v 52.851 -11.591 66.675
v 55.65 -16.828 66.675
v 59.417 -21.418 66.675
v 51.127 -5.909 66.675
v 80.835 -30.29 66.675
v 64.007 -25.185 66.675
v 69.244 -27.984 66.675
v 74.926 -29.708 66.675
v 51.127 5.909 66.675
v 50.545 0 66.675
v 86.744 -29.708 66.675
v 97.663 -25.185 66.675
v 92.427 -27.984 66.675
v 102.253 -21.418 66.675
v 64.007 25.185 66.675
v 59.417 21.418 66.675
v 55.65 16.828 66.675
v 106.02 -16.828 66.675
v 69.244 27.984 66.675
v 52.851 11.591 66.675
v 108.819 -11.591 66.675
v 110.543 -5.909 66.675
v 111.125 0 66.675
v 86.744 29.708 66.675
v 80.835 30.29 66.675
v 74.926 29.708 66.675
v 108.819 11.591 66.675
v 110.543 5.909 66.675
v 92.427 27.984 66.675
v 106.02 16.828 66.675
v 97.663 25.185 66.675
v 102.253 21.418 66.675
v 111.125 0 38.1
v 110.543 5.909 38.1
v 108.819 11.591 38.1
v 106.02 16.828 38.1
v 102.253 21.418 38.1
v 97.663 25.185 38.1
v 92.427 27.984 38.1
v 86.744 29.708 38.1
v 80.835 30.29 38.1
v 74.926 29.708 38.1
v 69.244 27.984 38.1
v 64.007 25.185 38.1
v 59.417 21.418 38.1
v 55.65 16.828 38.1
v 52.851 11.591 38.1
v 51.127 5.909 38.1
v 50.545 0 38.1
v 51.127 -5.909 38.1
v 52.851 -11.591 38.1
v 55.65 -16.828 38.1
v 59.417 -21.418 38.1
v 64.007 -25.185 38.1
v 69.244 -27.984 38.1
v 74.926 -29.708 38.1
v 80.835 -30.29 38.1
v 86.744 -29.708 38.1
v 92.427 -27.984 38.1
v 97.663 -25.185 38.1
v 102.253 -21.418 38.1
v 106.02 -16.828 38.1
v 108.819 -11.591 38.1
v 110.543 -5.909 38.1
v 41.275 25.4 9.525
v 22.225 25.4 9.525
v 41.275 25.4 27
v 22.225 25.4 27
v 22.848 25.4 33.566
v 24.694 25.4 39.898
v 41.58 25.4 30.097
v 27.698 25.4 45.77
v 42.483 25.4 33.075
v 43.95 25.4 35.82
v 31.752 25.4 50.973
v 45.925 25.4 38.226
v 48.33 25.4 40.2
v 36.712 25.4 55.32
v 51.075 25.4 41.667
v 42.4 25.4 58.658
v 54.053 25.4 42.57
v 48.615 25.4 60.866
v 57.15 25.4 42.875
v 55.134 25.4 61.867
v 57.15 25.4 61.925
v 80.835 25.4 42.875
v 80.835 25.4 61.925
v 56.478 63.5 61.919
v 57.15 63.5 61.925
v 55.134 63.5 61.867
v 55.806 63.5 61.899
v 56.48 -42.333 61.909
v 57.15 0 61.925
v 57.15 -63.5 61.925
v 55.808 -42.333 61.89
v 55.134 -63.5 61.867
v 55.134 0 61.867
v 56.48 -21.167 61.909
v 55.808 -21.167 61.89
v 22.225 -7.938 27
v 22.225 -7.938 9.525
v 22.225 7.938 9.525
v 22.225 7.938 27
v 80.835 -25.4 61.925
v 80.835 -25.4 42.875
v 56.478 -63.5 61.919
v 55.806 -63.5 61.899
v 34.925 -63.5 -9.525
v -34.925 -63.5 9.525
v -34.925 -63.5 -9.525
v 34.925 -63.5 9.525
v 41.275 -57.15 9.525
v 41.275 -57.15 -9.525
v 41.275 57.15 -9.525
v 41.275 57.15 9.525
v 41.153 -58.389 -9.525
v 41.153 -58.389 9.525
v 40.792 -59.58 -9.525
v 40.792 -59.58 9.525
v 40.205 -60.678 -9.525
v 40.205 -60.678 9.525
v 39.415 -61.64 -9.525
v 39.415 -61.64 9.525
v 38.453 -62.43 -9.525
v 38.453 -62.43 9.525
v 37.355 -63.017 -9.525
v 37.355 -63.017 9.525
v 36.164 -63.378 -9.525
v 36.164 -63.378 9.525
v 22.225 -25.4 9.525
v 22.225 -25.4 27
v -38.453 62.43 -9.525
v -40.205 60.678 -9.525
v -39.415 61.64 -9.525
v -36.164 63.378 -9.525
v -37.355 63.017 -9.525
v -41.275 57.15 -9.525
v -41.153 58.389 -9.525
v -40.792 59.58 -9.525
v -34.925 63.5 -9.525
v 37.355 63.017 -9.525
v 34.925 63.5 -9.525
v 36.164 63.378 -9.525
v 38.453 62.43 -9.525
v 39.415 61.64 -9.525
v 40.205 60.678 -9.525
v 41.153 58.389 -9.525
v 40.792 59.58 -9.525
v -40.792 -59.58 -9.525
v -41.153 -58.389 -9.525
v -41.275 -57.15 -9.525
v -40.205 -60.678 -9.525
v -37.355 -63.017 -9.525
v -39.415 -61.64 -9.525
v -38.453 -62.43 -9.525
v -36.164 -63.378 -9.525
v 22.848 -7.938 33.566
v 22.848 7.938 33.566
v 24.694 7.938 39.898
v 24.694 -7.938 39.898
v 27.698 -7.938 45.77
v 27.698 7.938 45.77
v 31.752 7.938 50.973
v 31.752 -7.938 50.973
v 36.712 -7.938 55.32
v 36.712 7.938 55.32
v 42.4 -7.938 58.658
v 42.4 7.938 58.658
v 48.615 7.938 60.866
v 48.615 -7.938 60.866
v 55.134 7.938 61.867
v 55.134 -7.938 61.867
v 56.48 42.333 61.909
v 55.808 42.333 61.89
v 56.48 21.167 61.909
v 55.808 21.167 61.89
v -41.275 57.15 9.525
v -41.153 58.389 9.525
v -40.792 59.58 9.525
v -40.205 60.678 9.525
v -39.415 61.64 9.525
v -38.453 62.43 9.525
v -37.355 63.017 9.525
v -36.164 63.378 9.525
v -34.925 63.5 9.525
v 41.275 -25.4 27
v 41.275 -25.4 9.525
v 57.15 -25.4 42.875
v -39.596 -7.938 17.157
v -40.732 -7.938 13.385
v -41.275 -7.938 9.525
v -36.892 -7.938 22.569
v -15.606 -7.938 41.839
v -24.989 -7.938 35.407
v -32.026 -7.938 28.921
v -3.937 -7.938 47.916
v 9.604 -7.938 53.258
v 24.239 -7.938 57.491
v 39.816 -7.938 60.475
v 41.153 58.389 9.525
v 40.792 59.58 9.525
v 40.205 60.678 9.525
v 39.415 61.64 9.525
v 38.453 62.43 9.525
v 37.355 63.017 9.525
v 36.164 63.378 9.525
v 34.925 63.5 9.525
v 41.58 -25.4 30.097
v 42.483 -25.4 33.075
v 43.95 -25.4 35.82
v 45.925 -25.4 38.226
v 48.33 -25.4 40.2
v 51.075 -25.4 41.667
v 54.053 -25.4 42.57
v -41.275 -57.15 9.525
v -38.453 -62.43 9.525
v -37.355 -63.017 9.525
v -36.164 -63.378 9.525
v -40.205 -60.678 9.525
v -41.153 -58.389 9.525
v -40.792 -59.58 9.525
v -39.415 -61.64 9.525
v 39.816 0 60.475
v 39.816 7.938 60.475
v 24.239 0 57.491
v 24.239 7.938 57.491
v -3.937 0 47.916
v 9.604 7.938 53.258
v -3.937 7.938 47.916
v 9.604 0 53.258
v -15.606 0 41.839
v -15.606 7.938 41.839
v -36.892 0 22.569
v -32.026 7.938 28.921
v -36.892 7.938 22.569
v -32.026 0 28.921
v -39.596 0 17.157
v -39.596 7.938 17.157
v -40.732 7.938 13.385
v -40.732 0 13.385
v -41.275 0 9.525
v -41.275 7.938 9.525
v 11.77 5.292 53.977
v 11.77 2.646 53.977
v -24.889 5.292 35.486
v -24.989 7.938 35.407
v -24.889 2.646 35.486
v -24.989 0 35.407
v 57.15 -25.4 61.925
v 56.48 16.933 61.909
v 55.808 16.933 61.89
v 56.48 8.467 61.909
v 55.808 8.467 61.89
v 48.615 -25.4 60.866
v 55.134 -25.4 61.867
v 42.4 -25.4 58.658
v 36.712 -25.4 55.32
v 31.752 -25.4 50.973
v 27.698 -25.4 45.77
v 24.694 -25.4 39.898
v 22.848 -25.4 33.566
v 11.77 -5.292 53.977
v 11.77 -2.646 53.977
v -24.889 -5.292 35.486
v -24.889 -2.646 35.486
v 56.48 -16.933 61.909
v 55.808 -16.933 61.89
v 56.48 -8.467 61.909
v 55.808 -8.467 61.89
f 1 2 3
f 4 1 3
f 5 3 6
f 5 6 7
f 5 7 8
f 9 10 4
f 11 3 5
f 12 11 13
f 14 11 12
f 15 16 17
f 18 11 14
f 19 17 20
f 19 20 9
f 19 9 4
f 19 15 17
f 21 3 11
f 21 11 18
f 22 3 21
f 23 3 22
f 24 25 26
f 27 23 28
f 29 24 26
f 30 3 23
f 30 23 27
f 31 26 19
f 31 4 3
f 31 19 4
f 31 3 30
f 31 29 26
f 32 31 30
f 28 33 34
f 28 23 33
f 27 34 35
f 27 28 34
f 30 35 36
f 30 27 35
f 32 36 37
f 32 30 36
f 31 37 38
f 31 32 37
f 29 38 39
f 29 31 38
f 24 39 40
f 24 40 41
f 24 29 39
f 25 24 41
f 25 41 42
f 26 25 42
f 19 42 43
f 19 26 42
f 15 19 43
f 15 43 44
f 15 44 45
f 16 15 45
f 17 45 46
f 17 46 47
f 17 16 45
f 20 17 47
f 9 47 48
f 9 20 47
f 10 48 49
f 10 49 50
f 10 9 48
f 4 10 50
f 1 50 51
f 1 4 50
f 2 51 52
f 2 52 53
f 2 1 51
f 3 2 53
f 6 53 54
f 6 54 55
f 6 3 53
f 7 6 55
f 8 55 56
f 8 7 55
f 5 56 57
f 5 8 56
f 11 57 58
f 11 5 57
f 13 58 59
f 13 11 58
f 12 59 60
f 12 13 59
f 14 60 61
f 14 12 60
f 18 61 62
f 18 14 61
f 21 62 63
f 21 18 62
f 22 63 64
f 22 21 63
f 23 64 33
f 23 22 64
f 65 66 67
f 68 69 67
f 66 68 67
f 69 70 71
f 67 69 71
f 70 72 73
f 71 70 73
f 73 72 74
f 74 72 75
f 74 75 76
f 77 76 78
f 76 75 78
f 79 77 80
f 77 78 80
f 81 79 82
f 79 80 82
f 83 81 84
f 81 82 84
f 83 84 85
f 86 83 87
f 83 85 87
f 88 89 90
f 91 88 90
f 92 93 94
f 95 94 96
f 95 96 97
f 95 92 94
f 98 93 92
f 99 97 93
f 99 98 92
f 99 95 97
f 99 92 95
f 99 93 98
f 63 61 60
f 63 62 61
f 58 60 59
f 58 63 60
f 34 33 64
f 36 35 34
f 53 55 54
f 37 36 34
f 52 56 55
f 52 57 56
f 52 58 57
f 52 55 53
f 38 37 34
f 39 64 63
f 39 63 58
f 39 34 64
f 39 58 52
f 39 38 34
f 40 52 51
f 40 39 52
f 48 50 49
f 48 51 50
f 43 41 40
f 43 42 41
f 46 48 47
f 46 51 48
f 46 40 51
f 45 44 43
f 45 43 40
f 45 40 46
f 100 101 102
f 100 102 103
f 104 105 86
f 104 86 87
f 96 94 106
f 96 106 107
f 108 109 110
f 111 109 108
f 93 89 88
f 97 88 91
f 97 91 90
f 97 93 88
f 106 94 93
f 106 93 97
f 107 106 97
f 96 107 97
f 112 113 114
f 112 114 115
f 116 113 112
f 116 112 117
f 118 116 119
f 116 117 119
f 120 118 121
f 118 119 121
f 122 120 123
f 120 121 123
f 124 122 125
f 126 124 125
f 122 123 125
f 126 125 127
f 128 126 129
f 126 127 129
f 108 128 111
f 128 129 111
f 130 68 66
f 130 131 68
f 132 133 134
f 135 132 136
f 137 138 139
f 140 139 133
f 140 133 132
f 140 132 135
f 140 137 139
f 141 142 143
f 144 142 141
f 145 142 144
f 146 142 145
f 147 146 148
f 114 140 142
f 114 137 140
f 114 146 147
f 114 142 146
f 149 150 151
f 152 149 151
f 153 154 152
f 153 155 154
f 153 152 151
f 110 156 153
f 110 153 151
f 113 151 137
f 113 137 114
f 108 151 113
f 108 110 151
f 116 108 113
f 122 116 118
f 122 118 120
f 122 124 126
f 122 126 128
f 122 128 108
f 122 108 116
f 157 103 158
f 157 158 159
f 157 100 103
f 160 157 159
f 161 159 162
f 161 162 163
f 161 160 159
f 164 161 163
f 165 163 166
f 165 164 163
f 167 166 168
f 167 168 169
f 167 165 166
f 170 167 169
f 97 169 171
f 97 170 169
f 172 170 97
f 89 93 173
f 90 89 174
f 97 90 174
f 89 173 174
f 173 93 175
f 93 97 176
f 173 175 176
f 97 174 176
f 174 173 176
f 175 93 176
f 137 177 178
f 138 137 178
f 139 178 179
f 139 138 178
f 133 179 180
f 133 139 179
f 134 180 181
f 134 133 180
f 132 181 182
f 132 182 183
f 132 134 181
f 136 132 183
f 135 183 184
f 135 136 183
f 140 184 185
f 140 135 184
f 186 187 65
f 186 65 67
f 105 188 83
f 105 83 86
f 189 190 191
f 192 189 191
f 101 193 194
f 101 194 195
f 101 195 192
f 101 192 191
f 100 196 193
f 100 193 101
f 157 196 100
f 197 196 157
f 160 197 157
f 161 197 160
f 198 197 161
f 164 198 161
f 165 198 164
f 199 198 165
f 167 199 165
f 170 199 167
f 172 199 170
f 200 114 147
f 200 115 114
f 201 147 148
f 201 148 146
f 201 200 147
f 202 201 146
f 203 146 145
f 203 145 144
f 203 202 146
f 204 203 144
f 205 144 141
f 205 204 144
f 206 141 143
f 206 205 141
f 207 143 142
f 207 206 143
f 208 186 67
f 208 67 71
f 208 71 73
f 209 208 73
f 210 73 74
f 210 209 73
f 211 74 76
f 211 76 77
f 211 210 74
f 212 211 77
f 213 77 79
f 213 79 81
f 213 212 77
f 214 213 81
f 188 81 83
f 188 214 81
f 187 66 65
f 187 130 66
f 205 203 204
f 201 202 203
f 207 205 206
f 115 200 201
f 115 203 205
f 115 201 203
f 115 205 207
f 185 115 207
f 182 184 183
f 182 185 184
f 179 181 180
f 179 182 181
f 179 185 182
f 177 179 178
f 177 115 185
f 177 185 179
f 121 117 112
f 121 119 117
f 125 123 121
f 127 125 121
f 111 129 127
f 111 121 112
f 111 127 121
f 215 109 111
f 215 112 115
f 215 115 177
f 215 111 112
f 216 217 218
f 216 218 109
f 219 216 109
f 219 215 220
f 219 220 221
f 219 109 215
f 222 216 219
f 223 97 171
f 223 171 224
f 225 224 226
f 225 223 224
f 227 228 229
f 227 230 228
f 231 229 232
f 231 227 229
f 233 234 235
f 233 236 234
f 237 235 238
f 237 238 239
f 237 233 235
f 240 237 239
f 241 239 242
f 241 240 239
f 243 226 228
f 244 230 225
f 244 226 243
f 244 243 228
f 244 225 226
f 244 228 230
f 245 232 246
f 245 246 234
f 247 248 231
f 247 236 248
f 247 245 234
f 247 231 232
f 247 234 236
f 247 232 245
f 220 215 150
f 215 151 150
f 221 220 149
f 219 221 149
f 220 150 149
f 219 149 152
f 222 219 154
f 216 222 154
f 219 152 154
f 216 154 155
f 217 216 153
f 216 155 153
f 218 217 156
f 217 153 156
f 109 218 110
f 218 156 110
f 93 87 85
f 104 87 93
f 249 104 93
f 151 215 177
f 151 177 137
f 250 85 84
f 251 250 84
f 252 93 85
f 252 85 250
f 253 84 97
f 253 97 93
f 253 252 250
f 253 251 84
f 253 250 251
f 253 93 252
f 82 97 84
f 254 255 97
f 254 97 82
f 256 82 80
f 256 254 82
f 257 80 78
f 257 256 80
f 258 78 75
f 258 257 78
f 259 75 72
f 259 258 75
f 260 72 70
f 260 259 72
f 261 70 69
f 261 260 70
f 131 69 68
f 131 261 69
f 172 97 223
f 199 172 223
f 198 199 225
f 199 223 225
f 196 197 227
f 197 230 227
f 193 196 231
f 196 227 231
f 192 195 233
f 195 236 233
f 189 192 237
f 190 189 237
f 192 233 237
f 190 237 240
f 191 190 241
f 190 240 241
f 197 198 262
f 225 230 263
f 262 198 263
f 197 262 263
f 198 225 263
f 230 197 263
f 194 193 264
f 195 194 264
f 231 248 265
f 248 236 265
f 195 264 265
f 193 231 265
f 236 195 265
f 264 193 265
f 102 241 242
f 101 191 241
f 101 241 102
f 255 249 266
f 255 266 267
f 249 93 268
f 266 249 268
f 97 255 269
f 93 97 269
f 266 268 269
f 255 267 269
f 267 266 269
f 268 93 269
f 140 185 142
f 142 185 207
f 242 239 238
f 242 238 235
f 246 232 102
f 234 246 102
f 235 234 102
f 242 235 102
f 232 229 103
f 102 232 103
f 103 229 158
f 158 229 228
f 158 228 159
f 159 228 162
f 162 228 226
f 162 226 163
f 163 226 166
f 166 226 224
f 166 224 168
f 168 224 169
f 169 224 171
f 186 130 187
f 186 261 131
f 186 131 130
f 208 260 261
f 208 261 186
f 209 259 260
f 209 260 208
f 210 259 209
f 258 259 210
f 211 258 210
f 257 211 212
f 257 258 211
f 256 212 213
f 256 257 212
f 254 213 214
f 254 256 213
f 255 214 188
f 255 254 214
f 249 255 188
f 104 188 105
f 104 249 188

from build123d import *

# Parameters (mm, degrees)
F1_DEPTH = 63.5
F0_W     = 20.5100586428
F0_H     = 19.05
F2_DEPTH = 25.4
F3_DEPTH = 7.9375
F5_R     = 6.35


with BuildPart() as f1:
    # F0 (on Front) → F1 (new body, symmetric)
    with BuildSketch(Plane.XZ):
        with BuildLine():
            ThreePointArc((57.15, 61.9252), (56.141801459, 61.9106448654), (55.1344432597, 61.8669915935))
            add(Edge.make_bspline(
                [(57.15, 61.9252), (56.480946151, 61.9111016232), (55.8090107276, 61.8916796175), (55.1344432597, 61.8669915935)],
                knots=[0, 0, 0, 0, 1.7546314336, 1.7546314336, 1.7546314336, 1.7546314336], degree=3))
        make_face()
    extrude(amount=F1_DEPTH, both=True)


with BuildPart() as f1b:
    # F0 (on Front) → F1, piece 2 (new body, symmetric)
    with BuildSketch(Plane.XZ):
        Polygon((-41.275, 9.525), (-41.275, -9.525), (41.275, -9.525), (41.275, 9.525), (22.225, 9.525), align=None)
    extrude(amount=F1_DEPTH, both=True)

    # F5
    f5_edges = [f1b.edges().sort_by_distance(p)[0] for p in [
        (-41.275, -63.5, 0),
        (41.275, -63.5, 0),
        (41.275, 63.5, 0),
        (-41.275, 63.5, 0),
    ]]
    fillet(f5_edges, radius=F5_R)


with BuildPart() as f2:
    # F0 (on Front) → F2 (new body, symmetric)
    with BuildSketch(Plane.XZ):
        with BuildLine():
            Line((22.225, 9.525), (41.275, 9.525))
            Line((41.275, 9.525), (41.275, 27.0002))
            ThreePointArc((41.275, 27.0002), (45.9246798487, 38.2255201513), (57.15, 42.8752))
            Line((57.15, 42.8752), (60.325, 42.8752))
            Line((60.325, 42.8752), (60.325, 61.9252))
            Line((60.325, 61.9252), (57.15, 61.9252))
            add(Edge.make_bspline(
                [(57.15, 61.9252), (56.480946151, 61.9111016232), (55.8090107276, 61.8916796175), (55.1344432597, 61.8669915935)],
                knots=[0, 0, 0, 0, 1.7546314336, 1.7546314336, 1.7546314336, 1.7546314336], degree=3))
            ThreePointArc((55.1344432597, 61.8669915935), (31.7516836763, 50.9727082735), (22.225, 27.0002))
            Line((22.225, 27.0002), (22.225, 9.525))
        make_face()
        with Locations((70.5800293214, 52.4002)):
            Rectangle(F0_W, F0_H)
    extrude(amount=F2_DEPTH, both=True)


with BuildPart() as f3:
    # F0 (on Front) → F3 (new body, symmetric)
    with BuildSketch(Plane.XZ):
        with BuildLine():
            add(Edge.make_bspline(
                [(55.1344432597, 61.8669915935), (12.9411290835, 60.3227879328), (-39.5496361419, 38.1761346473), (-41.275, 9.525)],
                knots=[1.7546314336, 1.7546314336, 1.7546314336, 1.7546314336, 111.5045361635, 111.5045361635, 111.5045361635, 111.5045361635], degree=3))
            Line((-41.275, 9.525), (22.225, 9.525))
            Line((22.225, 9.525), (22.225, 27.0002))
            ThreePointArc((22.225, 27.0002), (31.7516836763, 50.9727082735), (55.1344432597, 61.8669915935))
        make_face()
    extrude(amount=F3_DEPTH, both=True)


with BuildPart() as f4:
    # F0 (on Front) → F4 (revolve)
    with BuildSketch(Plane.XZ):
        Polygon((80.8350586428, 66.675), (80.8350586428, 61.9252), (80.8350586428, 42.8752), (80.8350586428, 38.1), (111.125, 38.1), (111.125, 66.675), align=None)
    revolve(axis=Axis((80.8350586428, 0, 52.3875), (0, 0, 1)))


solid = Compound([f1.part, f1b.part, f2.part, f3.part, f4.part])
